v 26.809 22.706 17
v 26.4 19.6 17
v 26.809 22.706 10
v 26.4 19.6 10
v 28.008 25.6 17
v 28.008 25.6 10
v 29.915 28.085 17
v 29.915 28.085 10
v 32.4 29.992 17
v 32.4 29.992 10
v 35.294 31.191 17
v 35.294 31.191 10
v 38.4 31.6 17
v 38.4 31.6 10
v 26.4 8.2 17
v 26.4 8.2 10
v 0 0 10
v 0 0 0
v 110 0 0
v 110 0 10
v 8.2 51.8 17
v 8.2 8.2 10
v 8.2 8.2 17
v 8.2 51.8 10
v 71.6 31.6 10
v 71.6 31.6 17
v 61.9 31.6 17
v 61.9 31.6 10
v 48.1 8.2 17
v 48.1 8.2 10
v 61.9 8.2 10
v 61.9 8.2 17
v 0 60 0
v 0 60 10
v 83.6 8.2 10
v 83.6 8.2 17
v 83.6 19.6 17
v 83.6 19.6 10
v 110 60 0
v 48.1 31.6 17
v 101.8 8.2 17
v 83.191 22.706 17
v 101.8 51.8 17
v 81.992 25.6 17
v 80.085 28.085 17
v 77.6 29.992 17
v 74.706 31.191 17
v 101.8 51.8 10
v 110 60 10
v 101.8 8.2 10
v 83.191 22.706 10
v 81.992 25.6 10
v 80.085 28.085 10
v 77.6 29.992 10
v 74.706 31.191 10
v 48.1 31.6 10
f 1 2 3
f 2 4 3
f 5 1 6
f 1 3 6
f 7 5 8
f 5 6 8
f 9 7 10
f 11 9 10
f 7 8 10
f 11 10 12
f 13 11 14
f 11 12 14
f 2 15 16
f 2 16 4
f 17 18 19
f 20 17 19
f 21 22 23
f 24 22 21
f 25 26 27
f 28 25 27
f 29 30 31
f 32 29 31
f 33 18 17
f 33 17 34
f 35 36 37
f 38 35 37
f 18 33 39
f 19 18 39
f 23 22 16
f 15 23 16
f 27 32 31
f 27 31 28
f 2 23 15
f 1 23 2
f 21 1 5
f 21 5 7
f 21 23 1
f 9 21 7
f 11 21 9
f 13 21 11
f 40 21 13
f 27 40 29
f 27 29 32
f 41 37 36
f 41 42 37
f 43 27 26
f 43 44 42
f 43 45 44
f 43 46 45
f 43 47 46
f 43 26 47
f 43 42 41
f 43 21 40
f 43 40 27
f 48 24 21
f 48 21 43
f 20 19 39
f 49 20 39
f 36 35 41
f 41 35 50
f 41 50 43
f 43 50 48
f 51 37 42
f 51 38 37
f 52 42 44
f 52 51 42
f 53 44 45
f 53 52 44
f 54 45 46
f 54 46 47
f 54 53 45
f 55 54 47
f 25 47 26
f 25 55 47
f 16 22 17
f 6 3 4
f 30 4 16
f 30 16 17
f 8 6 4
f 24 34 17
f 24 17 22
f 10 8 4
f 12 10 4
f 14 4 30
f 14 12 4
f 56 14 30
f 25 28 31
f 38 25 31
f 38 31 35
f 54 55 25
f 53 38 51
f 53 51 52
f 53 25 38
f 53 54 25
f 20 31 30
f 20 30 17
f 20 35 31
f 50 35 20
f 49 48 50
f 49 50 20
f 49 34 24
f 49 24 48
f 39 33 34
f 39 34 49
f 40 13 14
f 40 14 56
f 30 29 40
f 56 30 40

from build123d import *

# Parameters (mm, degrees)
SKETCH1_W            = 110
SKETCH1_H            = 60
BOSS_EXTRUDE1_DEPTH  = 10
SKETCH2_W            = 93.6
SKETCH2_H            = 43.6
BOSS_EXTRUDE3_DEPTH  = 7
SKETCH3_W            = 21.7
SKETCH3_H            = 23.4
CUT_EXTRUDE1_DEPTH   = 7
FILLET1_R            = 12
FILLET1_OF_MIRROR1_R = 12


with BuildPart() as part:
    # Sketch1 → Boss-Extrude1 (new body)
    with BuildSketch(Plane.XY):
        with Locations((55, 30)):
            Rectangle(SKETCH1_W, SKETCH1_H)
    extrude(amount=BOSS_EXTRUDE1_DEPTH)

    # Sketch2 → Boss-Extrude3 (add)
    with BuildSketch(Plane.XY.offset(10)):
        with Locations((55, 30)):
            Rectangle(SKETCH2_W, SKETCH2_H)
    extrude(amount=BOSS_EXTRUDE3_DEPTH)

    # Sketch3 → Cut-Extrude1 (cut)
    with BuildSketch(Plane.XY.offset(17)):
        with Locations((37.25, 19.9)):
            Rectangle(SKETCH3_W, SKETCH3_H)
    cut_extrude1 = extrude(amount=-CUT_EXTRUDE1_DEPTH, mode=Mode.SUBTRACT)

    # Fillet1
    fillet1_edges = [part.edges().sort_by_distance(p)[0] for p in [
        (26.4, 31.6, 13.5),
    ]]
    fillet(fillet1_edges, radius=FILLET1_R)

    # Mirror1: Cut-Extrude1 across plane
    add(cut_extrude1.mirror(Plane(origin=(55, 0, 0), x_dir=(0, 0, 1), z_dir=(1, 0, 0))), mode=Mode.SUBTRACT)

    # Fillet1 of Mirror1
    fillet1_of_mirror1_edges = [part.edges().sort_by_distance(p)[0] for p in [
        (83.6, 31.6, 13.5),
    ]]
    fillet(fillet1_of_mirror1_edges, radius=FILLET1_OF_MIRROR1_R)


solid = part.part
